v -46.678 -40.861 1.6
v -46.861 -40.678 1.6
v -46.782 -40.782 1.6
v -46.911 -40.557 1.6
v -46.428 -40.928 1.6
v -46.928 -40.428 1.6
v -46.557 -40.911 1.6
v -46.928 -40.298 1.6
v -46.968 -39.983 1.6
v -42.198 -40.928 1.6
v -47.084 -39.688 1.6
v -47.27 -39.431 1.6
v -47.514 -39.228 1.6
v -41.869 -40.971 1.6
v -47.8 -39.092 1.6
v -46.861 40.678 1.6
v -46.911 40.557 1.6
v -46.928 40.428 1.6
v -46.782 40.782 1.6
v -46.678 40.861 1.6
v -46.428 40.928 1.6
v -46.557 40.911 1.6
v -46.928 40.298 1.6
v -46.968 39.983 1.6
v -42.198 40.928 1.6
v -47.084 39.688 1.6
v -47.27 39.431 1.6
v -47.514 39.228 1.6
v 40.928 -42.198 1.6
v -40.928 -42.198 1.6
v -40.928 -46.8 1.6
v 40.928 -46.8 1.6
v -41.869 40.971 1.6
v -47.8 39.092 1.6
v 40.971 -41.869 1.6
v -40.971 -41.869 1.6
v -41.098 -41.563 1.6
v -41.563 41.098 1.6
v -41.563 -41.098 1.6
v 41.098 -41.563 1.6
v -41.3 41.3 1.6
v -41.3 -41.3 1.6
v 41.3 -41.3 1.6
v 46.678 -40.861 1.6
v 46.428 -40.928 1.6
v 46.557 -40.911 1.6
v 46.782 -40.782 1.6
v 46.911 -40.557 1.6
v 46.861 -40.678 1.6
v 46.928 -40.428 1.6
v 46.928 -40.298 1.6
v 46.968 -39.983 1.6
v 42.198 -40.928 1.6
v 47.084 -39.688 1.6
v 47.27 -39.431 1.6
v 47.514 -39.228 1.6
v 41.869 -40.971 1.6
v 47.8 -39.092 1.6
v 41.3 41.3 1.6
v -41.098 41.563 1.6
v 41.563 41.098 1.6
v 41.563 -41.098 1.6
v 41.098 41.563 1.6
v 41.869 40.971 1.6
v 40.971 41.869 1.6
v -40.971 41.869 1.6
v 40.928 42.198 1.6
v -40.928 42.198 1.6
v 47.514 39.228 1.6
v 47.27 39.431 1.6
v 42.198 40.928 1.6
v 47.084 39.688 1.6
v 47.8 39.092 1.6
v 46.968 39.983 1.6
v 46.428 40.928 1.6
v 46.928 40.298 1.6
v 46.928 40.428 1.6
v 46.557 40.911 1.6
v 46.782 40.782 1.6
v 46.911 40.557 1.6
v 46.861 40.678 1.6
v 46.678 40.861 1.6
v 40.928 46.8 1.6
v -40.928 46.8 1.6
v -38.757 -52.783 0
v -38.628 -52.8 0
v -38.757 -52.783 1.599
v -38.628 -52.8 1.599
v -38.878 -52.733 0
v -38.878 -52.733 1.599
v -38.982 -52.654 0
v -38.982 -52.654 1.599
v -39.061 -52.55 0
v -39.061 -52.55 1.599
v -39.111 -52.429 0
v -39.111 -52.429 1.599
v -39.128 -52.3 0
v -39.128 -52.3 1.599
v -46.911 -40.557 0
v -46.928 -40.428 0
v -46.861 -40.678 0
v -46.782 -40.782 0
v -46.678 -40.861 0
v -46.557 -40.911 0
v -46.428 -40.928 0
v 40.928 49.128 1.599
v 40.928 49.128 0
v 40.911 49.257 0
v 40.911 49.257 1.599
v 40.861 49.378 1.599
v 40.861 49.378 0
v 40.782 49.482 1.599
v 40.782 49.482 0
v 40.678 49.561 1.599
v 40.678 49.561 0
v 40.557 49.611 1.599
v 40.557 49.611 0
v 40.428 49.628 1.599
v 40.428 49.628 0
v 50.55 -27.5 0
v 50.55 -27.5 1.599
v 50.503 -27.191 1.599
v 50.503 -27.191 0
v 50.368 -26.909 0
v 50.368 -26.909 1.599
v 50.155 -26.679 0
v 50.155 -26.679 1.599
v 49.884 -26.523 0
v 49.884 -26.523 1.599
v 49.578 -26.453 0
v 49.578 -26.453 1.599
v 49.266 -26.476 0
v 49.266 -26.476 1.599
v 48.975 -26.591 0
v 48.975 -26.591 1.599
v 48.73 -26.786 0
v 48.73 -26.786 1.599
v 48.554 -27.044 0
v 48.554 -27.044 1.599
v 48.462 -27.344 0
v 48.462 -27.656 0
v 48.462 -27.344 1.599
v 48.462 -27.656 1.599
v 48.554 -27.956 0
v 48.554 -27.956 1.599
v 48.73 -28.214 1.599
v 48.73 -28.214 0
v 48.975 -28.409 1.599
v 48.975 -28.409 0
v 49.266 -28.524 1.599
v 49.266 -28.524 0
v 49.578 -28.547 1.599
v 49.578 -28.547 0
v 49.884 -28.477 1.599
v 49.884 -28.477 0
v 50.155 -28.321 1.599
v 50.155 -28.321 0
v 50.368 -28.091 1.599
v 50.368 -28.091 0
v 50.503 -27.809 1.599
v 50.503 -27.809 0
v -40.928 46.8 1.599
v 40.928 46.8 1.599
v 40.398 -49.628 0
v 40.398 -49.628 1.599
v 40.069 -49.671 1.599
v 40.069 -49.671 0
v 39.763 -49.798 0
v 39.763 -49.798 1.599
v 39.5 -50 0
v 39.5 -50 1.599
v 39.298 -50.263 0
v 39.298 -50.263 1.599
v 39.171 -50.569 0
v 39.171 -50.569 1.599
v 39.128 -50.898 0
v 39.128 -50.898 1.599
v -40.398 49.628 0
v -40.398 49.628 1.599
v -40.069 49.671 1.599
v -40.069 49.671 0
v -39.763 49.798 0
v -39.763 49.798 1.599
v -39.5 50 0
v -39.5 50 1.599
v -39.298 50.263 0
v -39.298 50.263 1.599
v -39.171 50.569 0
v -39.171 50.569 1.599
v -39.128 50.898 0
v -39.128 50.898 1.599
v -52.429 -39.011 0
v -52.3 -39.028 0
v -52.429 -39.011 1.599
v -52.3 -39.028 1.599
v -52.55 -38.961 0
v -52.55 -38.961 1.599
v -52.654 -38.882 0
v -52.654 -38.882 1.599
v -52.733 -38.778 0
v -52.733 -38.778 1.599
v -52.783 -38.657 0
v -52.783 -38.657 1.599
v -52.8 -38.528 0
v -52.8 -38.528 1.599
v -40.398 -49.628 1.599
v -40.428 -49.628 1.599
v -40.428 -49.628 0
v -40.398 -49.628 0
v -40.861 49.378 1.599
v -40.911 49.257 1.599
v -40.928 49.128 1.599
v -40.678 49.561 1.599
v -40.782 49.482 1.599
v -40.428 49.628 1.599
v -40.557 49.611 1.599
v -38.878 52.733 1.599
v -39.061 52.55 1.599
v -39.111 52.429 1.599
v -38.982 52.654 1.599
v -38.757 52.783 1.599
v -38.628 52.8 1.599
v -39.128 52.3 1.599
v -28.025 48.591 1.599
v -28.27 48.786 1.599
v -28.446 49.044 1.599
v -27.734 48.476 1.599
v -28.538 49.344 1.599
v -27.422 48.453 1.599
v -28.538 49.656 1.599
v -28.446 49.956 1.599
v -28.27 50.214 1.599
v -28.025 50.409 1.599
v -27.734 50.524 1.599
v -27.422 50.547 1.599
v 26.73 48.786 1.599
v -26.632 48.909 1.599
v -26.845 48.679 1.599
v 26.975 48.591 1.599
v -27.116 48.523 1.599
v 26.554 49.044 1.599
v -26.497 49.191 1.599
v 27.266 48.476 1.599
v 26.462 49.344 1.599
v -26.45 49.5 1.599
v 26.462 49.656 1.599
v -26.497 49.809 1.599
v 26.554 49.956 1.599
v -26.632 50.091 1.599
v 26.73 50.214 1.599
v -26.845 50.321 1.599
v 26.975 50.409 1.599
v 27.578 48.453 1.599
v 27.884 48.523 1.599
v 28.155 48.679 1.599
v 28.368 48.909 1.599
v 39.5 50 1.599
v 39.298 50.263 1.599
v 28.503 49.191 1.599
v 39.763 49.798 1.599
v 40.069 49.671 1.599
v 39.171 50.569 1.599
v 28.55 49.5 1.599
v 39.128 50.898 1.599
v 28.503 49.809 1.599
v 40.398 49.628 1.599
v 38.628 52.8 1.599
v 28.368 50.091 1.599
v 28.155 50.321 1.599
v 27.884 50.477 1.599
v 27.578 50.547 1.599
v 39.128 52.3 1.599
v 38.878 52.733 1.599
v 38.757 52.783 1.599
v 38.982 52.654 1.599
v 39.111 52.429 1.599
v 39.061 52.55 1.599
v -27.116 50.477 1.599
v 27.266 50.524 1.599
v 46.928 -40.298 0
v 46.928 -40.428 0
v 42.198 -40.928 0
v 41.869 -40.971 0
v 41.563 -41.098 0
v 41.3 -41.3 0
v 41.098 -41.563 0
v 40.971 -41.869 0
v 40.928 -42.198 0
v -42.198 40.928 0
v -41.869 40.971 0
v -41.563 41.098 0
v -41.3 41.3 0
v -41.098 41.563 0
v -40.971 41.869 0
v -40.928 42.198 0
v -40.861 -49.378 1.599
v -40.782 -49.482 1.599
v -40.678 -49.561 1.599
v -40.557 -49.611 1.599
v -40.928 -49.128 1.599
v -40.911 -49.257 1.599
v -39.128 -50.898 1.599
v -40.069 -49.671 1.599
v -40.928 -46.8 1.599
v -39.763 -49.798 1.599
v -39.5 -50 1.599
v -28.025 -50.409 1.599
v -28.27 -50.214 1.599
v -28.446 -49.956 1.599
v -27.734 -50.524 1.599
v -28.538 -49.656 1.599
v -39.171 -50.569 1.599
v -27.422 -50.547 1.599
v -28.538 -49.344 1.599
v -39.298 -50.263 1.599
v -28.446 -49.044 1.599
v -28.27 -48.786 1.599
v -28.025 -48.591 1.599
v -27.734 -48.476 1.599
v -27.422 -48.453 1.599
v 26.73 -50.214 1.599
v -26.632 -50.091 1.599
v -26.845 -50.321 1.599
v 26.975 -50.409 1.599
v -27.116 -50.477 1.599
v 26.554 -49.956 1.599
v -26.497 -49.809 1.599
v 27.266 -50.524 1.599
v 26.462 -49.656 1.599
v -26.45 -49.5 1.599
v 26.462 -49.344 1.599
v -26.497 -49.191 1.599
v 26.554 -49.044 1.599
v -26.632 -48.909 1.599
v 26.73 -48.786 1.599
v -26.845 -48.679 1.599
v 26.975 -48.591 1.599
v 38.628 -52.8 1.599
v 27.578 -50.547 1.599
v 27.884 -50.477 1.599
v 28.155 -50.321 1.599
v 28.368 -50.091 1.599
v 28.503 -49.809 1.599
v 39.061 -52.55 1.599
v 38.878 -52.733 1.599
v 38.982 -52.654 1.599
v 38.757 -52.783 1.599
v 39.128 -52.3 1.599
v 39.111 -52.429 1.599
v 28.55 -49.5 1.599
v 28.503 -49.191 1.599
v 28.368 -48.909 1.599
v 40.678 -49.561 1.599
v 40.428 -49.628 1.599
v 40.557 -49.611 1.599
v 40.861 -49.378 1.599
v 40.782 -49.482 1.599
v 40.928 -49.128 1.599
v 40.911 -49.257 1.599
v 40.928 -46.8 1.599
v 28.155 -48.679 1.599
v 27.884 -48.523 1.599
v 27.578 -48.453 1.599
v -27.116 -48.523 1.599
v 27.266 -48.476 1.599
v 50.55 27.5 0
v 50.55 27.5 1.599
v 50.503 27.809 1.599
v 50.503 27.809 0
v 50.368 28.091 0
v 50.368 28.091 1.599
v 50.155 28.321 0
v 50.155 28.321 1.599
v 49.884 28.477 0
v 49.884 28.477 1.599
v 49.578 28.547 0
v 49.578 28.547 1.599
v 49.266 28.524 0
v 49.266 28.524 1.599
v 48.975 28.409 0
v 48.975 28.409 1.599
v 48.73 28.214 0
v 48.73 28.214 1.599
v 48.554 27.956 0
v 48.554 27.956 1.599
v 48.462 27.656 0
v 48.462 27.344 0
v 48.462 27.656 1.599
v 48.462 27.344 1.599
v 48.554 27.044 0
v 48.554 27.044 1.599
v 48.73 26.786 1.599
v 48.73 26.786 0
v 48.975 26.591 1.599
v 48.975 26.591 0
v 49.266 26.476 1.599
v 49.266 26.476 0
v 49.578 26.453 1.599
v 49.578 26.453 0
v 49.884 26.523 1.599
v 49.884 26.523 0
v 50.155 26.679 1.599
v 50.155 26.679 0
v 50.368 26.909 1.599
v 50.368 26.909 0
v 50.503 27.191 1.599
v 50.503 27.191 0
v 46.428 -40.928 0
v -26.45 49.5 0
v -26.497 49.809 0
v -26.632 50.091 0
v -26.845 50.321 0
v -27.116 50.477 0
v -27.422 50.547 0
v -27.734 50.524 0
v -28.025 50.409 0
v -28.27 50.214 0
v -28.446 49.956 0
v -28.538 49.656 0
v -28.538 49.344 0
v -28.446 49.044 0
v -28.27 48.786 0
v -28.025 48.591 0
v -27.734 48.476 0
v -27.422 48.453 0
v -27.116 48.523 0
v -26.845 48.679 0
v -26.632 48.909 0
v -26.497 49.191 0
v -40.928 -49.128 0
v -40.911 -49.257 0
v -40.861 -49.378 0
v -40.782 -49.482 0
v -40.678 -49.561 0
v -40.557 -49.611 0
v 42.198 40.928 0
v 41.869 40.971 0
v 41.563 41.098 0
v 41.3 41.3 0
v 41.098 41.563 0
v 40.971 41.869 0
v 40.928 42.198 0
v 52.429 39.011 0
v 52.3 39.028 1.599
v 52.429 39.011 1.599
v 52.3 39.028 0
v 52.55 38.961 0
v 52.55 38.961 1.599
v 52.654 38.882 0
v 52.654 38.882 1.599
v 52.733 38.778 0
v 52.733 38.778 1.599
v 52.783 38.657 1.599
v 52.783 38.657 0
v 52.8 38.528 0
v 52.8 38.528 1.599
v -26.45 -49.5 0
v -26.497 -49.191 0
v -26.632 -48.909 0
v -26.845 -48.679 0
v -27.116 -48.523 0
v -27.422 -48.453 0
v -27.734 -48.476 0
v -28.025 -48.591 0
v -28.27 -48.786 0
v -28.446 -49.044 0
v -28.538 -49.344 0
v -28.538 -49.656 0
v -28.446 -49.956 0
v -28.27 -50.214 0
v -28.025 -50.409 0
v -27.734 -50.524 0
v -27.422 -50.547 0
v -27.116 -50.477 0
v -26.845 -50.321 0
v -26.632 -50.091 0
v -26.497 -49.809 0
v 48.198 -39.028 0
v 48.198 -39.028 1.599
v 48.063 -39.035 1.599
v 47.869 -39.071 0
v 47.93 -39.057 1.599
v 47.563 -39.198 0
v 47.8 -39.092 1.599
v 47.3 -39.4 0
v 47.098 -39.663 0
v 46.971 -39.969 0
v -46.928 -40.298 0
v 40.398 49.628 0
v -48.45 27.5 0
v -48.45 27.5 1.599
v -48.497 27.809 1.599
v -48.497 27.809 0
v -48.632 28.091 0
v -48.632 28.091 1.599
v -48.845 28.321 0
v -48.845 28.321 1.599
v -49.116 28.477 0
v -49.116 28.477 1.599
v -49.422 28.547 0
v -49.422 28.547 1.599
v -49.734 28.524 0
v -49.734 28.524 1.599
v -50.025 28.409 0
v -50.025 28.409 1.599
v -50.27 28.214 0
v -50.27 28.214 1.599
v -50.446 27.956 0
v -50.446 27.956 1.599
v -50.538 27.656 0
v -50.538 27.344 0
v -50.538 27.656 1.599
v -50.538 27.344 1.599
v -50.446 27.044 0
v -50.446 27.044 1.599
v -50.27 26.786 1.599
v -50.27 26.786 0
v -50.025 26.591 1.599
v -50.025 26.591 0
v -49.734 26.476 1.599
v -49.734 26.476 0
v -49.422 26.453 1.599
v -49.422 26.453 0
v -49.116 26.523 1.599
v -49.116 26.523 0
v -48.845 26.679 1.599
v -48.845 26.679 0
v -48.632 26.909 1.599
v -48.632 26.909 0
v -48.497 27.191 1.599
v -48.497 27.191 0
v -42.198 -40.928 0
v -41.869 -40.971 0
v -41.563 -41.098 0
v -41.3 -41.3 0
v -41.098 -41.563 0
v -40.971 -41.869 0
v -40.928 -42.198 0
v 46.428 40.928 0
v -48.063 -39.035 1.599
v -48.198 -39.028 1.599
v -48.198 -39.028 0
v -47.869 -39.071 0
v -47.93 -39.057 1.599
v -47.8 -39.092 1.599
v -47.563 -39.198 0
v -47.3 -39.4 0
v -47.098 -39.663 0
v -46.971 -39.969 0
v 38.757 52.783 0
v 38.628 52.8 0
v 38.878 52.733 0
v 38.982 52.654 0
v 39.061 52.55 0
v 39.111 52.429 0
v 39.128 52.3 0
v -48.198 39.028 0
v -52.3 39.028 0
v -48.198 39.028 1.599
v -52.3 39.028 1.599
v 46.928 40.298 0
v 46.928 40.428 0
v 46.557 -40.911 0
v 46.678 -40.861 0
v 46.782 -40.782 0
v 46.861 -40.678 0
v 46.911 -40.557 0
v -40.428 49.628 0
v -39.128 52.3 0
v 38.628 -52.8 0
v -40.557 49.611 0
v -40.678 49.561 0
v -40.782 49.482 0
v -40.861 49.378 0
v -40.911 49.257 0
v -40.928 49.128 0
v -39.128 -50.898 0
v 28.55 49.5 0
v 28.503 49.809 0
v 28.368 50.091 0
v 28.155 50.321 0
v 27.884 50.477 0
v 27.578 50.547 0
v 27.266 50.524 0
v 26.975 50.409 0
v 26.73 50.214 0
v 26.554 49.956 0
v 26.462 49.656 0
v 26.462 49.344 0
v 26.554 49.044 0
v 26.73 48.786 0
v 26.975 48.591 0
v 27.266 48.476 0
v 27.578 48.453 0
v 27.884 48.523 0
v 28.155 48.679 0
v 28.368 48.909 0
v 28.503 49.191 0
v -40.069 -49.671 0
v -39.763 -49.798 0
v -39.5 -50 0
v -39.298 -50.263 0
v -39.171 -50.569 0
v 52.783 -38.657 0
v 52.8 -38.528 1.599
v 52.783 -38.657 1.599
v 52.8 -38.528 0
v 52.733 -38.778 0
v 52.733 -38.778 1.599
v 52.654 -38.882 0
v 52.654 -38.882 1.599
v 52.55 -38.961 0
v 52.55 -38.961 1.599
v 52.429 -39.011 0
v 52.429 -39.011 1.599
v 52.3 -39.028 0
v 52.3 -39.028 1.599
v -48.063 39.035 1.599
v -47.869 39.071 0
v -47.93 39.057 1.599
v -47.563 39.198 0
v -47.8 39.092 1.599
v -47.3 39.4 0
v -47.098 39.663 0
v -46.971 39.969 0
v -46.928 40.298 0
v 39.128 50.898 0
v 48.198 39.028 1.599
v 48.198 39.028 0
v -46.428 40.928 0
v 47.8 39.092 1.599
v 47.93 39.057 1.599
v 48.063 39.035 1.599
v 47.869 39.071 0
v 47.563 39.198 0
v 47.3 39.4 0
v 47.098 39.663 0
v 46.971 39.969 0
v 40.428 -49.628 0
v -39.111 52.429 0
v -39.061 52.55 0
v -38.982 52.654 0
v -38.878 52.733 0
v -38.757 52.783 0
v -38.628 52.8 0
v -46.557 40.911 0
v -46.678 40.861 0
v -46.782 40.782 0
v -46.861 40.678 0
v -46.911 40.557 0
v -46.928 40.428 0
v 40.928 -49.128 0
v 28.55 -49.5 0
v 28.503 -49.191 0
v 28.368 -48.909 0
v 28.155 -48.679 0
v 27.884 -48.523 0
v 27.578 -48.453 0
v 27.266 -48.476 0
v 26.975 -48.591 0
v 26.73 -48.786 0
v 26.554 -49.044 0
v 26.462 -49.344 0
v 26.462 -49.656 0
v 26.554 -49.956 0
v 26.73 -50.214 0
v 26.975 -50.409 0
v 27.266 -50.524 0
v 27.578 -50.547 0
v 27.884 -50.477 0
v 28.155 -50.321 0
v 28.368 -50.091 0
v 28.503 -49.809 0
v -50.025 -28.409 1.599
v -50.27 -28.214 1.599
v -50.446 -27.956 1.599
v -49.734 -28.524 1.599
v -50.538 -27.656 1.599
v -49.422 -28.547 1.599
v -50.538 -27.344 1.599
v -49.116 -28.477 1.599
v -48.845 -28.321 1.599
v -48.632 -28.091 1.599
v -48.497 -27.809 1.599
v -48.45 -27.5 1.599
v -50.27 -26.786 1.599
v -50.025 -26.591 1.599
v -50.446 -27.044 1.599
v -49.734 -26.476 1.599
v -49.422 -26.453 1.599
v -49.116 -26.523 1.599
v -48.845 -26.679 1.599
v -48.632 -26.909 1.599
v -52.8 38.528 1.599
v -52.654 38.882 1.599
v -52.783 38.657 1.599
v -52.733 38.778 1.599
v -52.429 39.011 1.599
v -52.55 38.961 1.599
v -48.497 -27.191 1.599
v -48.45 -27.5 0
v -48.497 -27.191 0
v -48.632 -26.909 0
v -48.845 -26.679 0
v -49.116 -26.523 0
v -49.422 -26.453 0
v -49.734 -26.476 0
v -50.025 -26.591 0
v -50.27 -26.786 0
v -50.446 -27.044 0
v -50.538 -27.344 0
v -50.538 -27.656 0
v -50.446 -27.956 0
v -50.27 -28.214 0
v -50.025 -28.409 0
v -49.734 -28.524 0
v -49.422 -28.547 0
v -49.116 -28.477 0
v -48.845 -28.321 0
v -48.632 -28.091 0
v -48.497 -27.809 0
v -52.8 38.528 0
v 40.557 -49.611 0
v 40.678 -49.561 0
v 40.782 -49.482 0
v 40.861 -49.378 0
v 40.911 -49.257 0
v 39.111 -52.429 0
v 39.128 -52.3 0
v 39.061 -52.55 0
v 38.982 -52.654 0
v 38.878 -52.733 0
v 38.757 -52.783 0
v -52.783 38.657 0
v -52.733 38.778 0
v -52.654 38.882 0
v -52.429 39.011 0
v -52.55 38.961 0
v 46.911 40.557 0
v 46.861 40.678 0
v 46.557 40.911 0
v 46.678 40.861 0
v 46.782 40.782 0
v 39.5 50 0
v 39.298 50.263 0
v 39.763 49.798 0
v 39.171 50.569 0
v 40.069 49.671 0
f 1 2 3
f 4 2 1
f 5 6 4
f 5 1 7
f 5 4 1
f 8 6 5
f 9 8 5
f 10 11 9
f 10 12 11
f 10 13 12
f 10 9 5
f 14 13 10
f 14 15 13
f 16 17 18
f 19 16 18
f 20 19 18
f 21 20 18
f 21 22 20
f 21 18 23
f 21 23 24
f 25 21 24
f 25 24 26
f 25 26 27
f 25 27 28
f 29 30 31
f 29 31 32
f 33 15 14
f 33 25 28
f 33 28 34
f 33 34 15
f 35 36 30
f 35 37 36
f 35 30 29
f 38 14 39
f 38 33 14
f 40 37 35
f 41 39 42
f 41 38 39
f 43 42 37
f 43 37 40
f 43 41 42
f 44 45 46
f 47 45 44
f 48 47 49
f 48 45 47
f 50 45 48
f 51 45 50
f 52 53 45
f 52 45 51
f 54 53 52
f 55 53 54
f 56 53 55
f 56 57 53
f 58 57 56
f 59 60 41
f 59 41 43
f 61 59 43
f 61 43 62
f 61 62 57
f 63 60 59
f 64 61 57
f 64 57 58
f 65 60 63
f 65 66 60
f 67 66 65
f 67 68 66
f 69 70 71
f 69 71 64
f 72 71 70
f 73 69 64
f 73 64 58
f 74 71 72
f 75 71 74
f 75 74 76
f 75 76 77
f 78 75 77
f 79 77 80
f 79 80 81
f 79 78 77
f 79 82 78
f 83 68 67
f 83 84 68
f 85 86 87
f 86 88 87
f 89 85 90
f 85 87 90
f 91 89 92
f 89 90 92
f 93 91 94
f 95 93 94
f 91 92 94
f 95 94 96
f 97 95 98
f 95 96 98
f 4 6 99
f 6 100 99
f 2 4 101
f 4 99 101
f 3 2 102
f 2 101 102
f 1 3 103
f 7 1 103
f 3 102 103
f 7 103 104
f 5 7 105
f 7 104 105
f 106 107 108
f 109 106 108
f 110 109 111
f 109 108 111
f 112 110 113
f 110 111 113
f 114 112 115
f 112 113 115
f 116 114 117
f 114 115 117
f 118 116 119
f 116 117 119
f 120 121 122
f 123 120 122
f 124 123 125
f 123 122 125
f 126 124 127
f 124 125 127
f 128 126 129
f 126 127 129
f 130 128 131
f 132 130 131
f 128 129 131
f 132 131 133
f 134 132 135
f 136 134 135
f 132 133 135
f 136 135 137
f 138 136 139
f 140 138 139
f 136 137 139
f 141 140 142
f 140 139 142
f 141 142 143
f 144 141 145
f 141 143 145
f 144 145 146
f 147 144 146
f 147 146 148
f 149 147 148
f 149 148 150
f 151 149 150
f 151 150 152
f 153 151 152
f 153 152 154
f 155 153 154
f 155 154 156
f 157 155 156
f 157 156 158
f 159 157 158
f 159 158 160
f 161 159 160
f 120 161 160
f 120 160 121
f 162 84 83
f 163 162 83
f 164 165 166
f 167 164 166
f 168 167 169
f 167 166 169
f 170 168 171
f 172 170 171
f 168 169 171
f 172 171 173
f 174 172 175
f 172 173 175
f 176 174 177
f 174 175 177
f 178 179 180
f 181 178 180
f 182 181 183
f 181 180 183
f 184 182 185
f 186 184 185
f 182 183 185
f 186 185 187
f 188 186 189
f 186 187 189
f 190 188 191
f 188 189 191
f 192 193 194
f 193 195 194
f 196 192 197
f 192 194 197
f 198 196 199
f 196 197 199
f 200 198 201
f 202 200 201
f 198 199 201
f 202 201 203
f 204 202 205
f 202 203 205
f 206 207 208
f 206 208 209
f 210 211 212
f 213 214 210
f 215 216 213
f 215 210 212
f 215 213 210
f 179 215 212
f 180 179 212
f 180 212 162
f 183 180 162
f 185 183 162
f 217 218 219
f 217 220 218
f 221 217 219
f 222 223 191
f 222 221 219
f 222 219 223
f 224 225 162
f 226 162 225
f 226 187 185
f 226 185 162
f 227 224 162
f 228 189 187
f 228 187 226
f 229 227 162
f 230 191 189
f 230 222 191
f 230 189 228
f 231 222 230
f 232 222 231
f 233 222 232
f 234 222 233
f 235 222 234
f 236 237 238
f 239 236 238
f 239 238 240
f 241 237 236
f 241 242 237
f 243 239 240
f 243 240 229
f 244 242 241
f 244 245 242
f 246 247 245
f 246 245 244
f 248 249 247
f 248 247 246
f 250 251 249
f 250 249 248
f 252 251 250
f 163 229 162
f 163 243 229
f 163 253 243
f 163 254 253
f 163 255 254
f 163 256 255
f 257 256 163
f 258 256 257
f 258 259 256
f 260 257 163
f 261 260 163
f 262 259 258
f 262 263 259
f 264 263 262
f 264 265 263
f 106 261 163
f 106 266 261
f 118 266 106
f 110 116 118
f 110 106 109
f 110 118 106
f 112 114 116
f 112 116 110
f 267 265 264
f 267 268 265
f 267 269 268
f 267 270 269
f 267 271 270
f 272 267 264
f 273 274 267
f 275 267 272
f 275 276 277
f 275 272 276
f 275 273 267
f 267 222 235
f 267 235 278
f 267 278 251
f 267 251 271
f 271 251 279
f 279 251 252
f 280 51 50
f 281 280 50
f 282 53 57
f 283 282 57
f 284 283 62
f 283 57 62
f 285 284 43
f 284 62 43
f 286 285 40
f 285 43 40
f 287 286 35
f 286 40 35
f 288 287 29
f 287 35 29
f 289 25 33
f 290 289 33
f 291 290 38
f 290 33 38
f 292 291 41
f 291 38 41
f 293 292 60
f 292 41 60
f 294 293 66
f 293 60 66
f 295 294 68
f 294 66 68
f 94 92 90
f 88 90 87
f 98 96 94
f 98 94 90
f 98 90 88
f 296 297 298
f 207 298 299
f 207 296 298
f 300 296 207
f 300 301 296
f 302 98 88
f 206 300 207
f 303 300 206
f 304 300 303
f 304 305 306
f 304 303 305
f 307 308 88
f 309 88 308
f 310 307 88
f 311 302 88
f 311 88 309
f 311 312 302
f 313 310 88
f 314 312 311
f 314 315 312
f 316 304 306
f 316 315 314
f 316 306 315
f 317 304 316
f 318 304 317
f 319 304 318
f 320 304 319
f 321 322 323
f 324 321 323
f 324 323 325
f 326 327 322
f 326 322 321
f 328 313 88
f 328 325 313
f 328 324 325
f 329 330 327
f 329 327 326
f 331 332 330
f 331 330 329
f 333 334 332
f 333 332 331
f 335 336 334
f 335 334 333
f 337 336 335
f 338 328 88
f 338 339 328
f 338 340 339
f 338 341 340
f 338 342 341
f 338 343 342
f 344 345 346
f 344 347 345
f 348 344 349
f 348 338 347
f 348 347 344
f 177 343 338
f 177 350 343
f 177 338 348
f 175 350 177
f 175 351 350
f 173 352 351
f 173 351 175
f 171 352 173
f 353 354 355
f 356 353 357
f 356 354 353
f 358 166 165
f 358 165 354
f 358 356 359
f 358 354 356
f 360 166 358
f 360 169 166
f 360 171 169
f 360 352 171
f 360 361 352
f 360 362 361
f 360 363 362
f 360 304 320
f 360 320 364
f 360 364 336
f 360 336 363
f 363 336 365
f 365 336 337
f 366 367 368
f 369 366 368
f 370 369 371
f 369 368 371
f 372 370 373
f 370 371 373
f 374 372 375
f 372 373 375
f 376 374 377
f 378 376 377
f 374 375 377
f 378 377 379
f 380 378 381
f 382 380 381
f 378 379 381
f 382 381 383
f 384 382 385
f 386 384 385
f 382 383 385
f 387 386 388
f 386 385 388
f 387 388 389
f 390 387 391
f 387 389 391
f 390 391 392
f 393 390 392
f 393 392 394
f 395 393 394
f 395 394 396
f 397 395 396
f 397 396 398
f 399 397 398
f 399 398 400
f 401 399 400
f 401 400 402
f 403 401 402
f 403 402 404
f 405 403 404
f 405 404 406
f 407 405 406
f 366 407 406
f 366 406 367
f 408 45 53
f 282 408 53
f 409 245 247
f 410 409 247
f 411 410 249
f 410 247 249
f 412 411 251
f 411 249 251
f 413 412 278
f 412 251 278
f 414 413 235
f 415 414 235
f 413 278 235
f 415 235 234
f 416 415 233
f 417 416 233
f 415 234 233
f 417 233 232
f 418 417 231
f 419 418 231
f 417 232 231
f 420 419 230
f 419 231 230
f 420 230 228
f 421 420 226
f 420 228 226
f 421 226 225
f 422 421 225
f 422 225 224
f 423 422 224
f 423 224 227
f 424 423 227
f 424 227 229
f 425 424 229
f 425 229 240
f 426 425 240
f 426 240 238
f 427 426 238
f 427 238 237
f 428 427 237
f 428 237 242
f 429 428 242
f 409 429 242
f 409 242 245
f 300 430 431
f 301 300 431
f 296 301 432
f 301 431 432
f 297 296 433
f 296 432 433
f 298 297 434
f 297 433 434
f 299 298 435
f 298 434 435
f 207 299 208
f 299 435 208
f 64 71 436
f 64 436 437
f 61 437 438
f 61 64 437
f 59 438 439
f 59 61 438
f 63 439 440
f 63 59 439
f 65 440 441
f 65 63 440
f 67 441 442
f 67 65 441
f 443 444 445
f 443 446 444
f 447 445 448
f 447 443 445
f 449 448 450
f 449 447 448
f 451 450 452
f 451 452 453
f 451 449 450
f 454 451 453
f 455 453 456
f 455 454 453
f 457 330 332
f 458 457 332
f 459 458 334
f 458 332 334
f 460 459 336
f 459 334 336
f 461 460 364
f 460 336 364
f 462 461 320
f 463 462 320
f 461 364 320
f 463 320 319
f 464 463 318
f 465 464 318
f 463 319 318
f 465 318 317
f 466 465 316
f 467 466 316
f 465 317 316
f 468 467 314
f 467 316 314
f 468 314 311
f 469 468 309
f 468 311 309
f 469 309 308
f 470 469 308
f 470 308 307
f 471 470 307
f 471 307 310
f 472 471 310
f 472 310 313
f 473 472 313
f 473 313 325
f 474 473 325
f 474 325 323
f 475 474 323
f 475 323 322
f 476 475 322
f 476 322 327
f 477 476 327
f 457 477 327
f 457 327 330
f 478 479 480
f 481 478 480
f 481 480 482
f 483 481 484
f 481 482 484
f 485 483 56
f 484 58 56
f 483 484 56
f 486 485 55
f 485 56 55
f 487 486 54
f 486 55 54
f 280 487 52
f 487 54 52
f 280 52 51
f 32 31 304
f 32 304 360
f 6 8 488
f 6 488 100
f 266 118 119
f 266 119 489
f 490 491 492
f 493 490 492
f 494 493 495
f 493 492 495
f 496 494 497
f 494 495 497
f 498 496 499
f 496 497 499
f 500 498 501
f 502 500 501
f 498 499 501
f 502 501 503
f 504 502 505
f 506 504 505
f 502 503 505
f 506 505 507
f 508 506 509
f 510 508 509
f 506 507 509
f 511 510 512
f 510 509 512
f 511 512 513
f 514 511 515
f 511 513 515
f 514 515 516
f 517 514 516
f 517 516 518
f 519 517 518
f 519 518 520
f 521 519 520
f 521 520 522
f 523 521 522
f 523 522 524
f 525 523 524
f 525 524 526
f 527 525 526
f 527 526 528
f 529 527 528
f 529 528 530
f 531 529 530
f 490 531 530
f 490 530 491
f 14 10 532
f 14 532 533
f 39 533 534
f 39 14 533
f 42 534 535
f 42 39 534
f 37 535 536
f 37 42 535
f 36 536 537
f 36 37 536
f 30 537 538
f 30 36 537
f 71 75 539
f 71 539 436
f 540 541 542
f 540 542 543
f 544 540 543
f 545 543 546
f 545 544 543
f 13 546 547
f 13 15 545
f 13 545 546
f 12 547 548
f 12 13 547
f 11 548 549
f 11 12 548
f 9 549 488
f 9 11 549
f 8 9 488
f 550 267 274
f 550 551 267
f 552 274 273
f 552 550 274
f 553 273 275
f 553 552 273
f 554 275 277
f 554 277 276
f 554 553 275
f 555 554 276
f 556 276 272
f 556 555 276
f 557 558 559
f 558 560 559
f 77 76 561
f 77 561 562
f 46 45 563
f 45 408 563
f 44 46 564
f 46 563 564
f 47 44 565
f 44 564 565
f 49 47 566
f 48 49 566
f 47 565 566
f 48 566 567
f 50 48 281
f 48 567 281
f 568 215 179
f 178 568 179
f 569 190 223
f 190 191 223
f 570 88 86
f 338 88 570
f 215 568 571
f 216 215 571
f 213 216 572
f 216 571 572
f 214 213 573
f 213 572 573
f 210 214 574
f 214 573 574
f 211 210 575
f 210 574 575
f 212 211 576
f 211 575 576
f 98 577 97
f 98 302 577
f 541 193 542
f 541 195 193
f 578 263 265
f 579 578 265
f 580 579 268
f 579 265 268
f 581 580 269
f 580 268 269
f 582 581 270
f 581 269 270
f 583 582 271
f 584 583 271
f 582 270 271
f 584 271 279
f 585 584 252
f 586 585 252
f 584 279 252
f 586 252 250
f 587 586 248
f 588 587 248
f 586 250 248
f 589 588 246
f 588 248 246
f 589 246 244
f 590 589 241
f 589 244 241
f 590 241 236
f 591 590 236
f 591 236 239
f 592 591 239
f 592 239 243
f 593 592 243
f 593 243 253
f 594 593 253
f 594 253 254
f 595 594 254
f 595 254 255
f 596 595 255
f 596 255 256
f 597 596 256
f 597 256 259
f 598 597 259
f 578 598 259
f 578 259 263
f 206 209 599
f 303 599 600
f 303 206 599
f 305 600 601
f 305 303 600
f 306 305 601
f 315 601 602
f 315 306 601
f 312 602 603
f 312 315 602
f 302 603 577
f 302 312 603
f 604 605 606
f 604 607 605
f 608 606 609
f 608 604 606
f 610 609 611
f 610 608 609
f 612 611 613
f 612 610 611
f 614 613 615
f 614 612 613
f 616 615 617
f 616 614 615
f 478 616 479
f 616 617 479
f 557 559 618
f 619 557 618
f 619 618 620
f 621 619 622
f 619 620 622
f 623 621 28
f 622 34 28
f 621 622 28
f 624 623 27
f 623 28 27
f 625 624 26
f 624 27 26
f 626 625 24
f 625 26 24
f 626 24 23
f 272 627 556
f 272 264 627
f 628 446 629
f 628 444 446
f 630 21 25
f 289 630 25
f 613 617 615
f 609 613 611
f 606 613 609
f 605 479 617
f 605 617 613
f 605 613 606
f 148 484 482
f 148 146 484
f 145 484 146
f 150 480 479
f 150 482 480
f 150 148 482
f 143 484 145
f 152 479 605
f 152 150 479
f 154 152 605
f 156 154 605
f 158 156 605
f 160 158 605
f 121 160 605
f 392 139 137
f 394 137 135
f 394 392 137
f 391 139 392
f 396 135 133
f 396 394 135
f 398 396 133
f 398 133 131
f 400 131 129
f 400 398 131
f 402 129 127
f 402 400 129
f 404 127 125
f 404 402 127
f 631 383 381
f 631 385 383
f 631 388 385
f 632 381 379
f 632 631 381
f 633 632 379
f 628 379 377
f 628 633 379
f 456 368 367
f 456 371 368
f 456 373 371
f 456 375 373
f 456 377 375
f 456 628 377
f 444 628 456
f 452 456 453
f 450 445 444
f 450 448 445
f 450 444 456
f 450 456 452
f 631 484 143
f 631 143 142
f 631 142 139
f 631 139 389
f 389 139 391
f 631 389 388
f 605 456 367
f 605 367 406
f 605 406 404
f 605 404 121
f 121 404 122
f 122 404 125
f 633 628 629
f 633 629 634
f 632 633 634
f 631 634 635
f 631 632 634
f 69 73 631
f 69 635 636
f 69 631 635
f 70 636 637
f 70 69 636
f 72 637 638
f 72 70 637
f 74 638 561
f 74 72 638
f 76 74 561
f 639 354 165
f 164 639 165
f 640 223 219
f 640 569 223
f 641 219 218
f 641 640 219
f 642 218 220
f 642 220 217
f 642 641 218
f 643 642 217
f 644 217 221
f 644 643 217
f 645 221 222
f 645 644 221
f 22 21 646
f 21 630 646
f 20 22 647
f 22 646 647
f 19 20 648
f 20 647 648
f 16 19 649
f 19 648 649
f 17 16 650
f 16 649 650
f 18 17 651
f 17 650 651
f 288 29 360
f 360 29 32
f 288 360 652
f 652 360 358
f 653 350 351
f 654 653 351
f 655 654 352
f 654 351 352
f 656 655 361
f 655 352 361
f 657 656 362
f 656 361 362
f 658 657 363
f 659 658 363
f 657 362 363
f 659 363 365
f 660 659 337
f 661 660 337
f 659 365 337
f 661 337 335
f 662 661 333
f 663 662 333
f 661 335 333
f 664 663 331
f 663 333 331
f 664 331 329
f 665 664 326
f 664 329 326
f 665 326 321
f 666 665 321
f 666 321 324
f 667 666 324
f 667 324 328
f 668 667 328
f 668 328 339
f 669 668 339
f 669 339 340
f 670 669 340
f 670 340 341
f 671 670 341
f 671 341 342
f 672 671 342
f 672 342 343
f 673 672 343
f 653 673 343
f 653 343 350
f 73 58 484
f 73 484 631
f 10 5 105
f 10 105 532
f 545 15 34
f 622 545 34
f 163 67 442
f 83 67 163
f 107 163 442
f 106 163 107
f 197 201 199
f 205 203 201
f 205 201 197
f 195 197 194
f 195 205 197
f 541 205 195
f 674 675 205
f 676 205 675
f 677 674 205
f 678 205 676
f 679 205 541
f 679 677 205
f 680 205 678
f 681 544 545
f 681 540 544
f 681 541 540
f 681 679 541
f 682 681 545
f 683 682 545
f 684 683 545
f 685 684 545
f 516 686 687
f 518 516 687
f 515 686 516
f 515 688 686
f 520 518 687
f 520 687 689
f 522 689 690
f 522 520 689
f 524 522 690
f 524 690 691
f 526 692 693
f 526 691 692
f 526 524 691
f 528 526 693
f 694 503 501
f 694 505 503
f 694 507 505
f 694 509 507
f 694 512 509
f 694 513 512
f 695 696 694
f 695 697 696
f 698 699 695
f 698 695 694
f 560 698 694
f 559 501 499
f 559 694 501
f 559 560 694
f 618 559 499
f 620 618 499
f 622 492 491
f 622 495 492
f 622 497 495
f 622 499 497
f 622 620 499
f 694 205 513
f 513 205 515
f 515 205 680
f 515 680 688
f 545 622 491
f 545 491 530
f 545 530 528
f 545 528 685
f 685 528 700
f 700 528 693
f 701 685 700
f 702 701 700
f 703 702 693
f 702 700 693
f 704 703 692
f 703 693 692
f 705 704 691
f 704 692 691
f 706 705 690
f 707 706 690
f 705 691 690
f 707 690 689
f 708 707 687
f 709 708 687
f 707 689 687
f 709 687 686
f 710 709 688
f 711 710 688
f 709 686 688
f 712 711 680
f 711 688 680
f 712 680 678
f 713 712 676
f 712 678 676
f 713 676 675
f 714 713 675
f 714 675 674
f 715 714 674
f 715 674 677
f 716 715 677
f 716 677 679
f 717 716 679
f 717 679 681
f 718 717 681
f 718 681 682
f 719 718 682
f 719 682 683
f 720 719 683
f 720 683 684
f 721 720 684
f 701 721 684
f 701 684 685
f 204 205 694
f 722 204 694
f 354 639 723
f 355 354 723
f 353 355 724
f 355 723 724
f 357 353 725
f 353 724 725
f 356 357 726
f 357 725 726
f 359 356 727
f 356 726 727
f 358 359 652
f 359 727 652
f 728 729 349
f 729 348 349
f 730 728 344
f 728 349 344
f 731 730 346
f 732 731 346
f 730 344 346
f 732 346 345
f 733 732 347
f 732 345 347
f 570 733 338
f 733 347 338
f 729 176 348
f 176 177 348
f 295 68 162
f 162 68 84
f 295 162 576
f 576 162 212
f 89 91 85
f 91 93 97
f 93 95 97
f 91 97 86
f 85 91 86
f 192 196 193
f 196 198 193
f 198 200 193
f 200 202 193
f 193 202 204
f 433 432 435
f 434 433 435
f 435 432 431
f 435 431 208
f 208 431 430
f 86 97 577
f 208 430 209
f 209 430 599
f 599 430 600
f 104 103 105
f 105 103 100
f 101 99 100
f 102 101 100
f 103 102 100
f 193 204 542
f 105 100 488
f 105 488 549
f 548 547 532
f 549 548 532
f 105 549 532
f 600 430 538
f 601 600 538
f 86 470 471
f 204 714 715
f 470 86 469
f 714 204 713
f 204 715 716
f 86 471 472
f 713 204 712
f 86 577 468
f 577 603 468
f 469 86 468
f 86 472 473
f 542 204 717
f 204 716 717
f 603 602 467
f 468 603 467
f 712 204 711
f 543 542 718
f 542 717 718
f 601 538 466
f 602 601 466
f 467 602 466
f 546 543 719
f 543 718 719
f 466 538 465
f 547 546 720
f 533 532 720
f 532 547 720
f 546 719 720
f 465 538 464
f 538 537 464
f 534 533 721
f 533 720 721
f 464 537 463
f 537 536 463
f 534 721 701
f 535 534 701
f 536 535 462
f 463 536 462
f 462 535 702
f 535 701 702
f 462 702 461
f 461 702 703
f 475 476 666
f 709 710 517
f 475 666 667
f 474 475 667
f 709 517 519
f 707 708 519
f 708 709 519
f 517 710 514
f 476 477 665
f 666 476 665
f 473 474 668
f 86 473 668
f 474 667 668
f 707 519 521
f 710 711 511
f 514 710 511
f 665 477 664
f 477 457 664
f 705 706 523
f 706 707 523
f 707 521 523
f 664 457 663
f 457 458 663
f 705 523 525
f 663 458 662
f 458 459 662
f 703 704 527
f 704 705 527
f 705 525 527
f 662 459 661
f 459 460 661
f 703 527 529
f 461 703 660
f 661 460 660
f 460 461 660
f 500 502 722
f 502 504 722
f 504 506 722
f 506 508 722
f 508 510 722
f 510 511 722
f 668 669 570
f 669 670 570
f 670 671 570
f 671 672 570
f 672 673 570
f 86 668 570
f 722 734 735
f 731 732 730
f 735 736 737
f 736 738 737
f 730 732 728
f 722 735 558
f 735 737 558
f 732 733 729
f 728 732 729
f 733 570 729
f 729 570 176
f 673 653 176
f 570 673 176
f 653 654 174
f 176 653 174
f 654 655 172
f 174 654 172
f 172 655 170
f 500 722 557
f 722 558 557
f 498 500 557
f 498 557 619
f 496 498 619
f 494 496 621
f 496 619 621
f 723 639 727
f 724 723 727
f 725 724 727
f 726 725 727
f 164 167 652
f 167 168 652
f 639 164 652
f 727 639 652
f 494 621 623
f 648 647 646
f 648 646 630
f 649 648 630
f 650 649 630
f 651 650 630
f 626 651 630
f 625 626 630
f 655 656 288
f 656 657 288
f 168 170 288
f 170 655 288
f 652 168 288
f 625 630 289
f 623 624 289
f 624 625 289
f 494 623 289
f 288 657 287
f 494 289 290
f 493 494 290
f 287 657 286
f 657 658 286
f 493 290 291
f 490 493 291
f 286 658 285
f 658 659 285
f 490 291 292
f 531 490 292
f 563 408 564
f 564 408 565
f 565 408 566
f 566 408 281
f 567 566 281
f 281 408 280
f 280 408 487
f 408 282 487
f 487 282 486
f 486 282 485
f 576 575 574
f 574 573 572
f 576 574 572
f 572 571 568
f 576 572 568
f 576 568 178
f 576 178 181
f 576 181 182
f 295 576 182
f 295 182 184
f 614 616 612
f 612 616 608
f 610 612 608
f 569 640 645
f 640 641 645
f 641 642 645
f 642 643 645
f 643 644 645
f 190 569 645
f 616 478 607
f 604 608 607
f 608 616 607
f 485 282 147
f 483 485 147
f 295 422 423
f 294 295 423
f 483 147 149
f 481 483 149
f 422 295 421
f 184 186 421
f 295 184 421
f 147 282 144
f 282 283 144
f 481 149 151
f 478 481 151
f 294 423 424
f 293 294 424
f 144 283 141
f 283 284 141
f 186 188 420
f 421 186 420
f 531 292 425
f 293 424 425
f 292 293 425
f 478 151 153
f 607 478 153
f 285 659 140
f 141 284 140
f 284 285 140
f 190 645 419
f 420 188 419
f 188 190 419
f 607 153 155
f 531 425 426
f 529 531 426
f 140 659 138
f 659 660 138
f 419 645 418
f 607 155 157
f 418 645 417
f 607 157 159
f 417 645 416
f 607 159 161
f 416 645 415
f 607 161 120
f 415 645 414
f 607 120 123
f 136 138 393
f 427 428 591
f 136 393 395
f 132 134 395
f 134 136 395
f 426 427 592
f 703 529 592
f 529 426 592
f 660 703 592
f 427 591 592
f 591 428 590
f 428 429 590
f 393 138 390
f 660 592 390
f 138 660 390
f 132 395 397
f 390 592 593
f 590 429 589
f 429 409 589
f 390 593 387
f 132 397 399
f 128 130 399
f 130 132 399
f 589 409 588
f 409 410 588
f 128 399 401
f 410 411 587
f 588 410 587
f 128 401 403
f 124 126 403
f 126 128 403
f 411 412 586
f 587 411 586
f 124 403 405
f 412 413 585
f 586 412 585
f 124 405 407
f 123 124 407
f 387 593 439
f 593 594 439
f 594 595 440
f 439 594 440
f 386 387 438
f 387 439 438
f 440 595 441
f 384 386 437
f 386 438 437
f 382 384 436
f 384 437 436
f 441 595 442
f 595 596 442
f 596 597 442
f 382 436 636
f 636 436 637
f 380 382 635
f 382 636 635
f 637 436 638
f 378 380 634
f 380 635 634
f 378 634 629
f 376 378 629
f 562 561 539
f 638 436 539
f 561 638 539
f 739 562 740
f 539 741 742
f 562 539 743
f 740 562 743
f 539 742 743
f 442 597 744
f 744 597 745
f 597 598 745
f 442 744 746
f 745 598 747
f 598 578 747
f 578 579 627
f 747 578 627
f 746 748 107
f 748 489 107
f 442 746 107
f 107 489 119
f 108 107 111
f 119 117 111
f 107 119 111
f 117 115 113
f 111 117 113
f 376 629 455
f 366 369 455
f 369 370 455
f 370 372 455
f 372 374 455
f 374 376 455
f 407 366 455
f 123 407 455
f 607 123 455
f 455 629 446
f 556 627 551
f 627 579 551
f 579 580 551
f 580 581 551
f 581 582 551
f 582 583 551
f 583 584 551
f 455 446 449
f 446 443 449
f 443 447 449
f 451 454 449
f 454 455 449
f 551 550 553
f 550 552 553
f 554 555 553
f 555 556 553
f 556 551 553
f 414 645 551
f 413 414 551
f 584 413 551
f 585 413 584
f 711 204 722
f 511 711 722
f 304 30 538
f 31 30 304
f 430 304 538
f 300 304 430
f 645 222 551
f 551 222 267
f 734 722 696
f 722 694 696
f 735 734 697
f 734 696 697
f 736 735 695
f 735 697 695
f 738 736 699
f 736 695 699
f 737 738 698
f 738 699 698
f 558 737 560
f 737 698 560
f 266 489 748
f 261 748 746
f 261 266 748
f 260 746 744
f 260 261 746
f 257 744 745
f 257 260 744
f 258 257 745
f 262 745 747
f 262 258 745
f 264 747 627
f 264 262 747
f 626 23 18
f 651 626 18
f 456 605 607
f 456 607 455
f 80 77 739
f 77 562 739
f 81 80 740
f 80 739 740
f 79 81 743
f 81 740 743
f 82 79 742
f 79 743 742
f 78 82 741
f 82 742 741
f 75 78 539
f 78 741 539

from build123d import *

# Parameters (mm, degrees)
SKETCH1_W                 = 106
SKETCH1_H                 = 106
MAINOUTLINE_DEPTH         = 1.6
SKETCH4_W                 = 11.7
SKETCH4_H                 = 11.7
RAILCUTOUTS_DEPTH         = 2.6
FILLETCUTOUTS_START       = -2.6
SKETCH13_W                = 5.7
SKETCH13_H                = 1.9
SKETCH13_W_2              = 1.8
SKETCH13_H_2              = 3
FILLETCUTOUTS_DEPTH       = 3.6
SMOOTHCORNER_DEPTH        = 10
MIRROR2_COPY_1_SKETCH_W   = 11.7
MIRROR2_COPY_1_SKETCH_H   = 11.7
MIRROR2_COPY_1_DEPTH      = 2.6
MIRROR2_START             = -2.6
MIRROR2_COPY_2_SKETCH_W   = 5.7
MIRROR2_COPY_2_SKETCH_H   = 1.9
MIRROR2_COPY_2_SKETCH_W_2 = 1.8
MIRROR2_COPY_2_SKETCH_H_2 = 3
MIRROR2_COPY_2_DEPTH      = 3.6
MIRROR2_COPY_3_DEPTH      = 10
MIRROR2_COPY_4_SKETCH_W   = 11.7
MIRROR2_COPY_4_SKETCH_H   = 11.7
MIRROR2_COPY_4_DEPTH      = 2.6
MIRROR2_COPY_5_SKETCH_W   = 5.7
MIRROR2_COPY_5_SKETCH_H   = 1.9
MIRROR2_COPY_5_SKETCH_W_2 = 1.8
MIRROR2_COPY_5_SKETCH_H_2 = 3
MIRROR2_COPY_5_DEPTH      = 3.6
FILLET10_R                = 0.5
M2_CLEARANCE_HOLE1_D      = 2.1
SKETCH16_W                = 90
SKETCH16_H                = 6.2
SKETCH16_W_2              = 5.2
SKETCH16_H_2              = 90
CUT_EXTRUDE6_DEPTH        = 0.001
SKETCH24_OUTSIDE_W        = 137.984
SKETCH24_OUTSIDE_H        = 137.984
SKETCH24_OUTSIDE_W_2      = 105.6
SKETCH24_OUTSIDE_H_2      = 105.6
CUT_EXTRUDE19_DEPTH       = 2.6
FILLET7_R                 = 0.5


with BuildPart() as part:
    # Sketch1 → mainOutline (new body)
    with BuildSketch(Plane.XY):
        Rectangle(SKETCH1_W, SKETCH1_H)
    extrude(amount=MAINOUTLINE_DEPTH)

    # Sketch4 → railCutouts (cut, through all)
    with BuildSketch(Plane(origin=(0, 0, 0), x_dir=(-1, 0, 0), z_dir=(0, 0, -1))):
        with Locations((47.15, 47.15)):
            Rectangle(SKETCH4_W, SKETCH4_H)
    railcutouts = extrude(amount=-RAILCUTOUTS_DEPTH, mode=Mode.SUBTRACT)

    # Sketch13 → filletCutouts (cut)
    with BuildSketch(Plane(origin=(0, 0, 0), x_dir=(-1, 0, 0), z_dir=(0, 0, -1)).offset(FILLETCUTOUTS_START)):
        with Locations((50.15, 40.35)):
            Rectangle(SKETCH13_W, SKETCH13_H)
        with Locations((40.4, 51.5)):
            Rectangle(SKETCH13_W_2, SKETCH13_H_2)
    filletcutouts = extrude(amount=FILLETCUTOUTS_DEPTH, mode=Mode.SUBTRACT)

    # Sketch27 → smoothCorner (cut)
    with BuildSketch(Plane.XY.offset(1.6)):
        with BuildLine():
            Line((-40.928025612, 42.198025612), (-40.928025612, 49.628025612))
            Line((-40.928025612, 49.628025612), (-40.398025612, 49.628025612))
            ThreePointArc((-40.398025612, 49.628025612), (-39.5, 50), (-39.128025612, 50.898025612))
            Line((-39.128025612, 50.898025612), (-39.128025612, 53))
            Line((-39.128025612, 53), (-53, 53))
            Line((-53, 53), (-53, 39.028025612))
            Line((-53, 39.028025612), (-48.198025612, 39.028025612))
            ThreePointArc((-48.198025612, 39.028025612), (-47.3, 39.4), (-46.928025612, 40.298025612))
            Line((-46.928025612, 40.298025612), (-46.928025612, 40.928025612))
            Line((-46.928025612, 40.928025612), (-42.198025612, 40.928025612))
            ThreePointArc((-42.198025612, 40.928025612), (-41.3, 41.3), (-40.928025612, 42.198025612))
        make_face()
    smoothcorner = extrude(amount=-SMOOTHCORNER_DEPTH, mode=Mode.SUBTRACT)

    # Mirror1: railCutouts, filletCutouts, smoothCorner across plane
    add(railcutouts.mirror(Plane(origin=(0, 0, 0), x_dir=(0, 0, 1), z_dir=(1, 0, 0))), mode=Mode.SUBTRACT)
    add(filletcutouts.mirror(Plane(origin=(0, 0, 0), x_dir=(0, 0, 1), z_dir=(1, 0, 0))), mode=Mode.SUBTRACT)
    add(smoothcorner.mirror(Plane(origin=(0, 0, 0), x_dir=(0, 0, 1), z_dir=(1, 0, 0))), mode=Mode.SUBTRACT)

    # Mirror2: smoothCorner across plane
    add(smoothcorner.mirror(Plane.ZX), mode=Mode.SUBTRACT)

    # Mirror2 copy 1 sketch → Mirror2 copy 1 (cut, through all)
    with BuildSketch(Plane(origin=(0, 0, 0), x_dir=(1, 0, 0), z_dir=(0, 0, -1))):
        with Locations((47.15, 47.15)):
            Rectangle(MIRROR2_COPY_1_SKETCH_W, MIRROR2_COPY_1_SKETCH_H)
    extrude(amount=-MIRROR2_COPY_1_DEPTH, mode=Mode.SUBTRACT)

    # Mirror2 copy 2 sketch → Mirror2 copy 2 (cut)
    with BuildSketch(Plane(origin=(0, 0, 0), x_dir=(1, 0, 0), z_dir=(0, 0, -1)).offset(MIRROR2_START)):
        with Locations((50.15, 40.35)):
            Rectangle(MIRROR2_COPY_2_SKETCH_W, MIRROR2_COPY_2_SKETCH_H)
        with Locations((40.4, 51.5)):
            Rectangle(MIRROR2_COPY_2_SKETCH_W_2, MIRROR2_COPY_2_SKETCH_H_2)
    extrude(amount=MIRROR2_COPY_2_DEPTH, mode=Mode.SUBTRACT)

    # Mirror2 copy 3 sketch → Mirror2 copy 3 (cut)
    with BuildSketch(Plane(origin=(0, 0, 1.6), x_dir=(-1, 0, 0), z_dir=(0, 0, 1))):
        with BuildLine():
            Line((-40.928025612, 42.198025612), (-40.928025612, 49.628025612))
            Line((-40.928025612, 49.628025612), (-40.398025612, 49.628025612))
            ThreePointArc((-40.398025612, 49.628025612), (-39.5, 50), (-39.128025612, 50.898025612))
            Line((-39.128025612, 50.898025612), (-39.128025612, 53))
            Line((-39.128025612, 53), (-53, 53))
            Line((-53, 53), (-53, 39.028025612))
            Line((-53, 39.028025612), (-48.198025612, 39.028025612))
            ThreePointArc((-48.198025612, 39.028025612), (-47.3, 39.4), (-46.928025612, 40.298025612))
            Line((-46.928025612, 40.298025612), (-46.928025612, 40.928025612))
            Line((-46.928025612, 40.928025612), (-42.198025612, 40.928025612))
            ThreePointArc((-42.198025612, 40.928025612), (-41.3, 41.3), (-40.928025612, 42.198025612))
        make_face()
    extrude(amount=-MIRROR2_COPY_3_DEPTH, mode=Mode.SUBTRACT)

    # Mirror2 copy 4 sketch → Mirror2 copy 4 (cut, through all)
    with BuildSketch(Plane(origin=(0, 0, 0), x_dir=(-1, 0, 0), z_dir=(0, 0, -1))):
        with Locations((47.15, -47.15)):
            Rectangle(MIRROR2_COPY_4_SKETCH_W, MIRROR2_COPY_4_SKETCH_H)
    extrude(amount=-MIRROR2_COPY_4_DEPTH, mode=Mode.SUBTRACT)

    # Mirror2 copy 5 sketch → Mirror2 copy 5 (cut)
    with BuildSketch(Plane(origin=(0, 0, 0), x_dir=(-1, 0, 0), z_dir=(0, 0, -1)).offset(MIRROR2_START)):
        with Locations((50.15, -40.35)):
            Rectangle(MIRROR2_COPY_5_SKETCH_W, MIRROR2_COPY_5_SKETCH_H)
        with Locations((40.4, -51.5)):
            Rectangle(MIRROR2_COPY_5_SKETCH_W_2, MIRROR2_COPY_5_SKETCH_H_2)
    extrude(amount=MIRROR2_COPY_5_DEPTH, mode=Mode.SUBTRACT)

    # Fillet10
    fillet10_edges = [part.edges().sort_by_distance(p)[0] for p in [
        (40.928025612, 49.628025612, 0.8),
        (46.928025612, 40.928025612, 0.8),
        (46.928025612, -40.928025612, 0.8),
        (40.928025612, -49.628025612, 0.8),
        (-40.928025612, -49.628025612, 0.8),
        (-46.928025612, -40.928025612, 0.8),
        (-46.928025612, 40.928025612, 0.8),
        (-40.928025612, 49.628025612, 0.8),
    ]]
    fillet(fillet10_edges, radius=FILLET10_R)

    # M2 Clearance Hole1 (through all)
    with Locations(Plane(origin=(0, 0, 0), x_dir=(-1, 0, 0), z_dir=(0, 0, -1))):
        with Locations((49.5, -27.5), (27.5, -49.5), (-49.5, -27.5), (-27.5, -49.5), (-27.5, 49.5), (-49.5, 27.5), (27.5, 49.5), (49.5, 27.5)):
            Hole(M2_CLEARANCE_HOLE1_D / 2)

    # Sketch16 → Cut-Extrude6 (cut)
    with BuildSketch(Plane.XY.offset(1.6)):
        with Locations((0, -49.9)):
            Rectangle(SKETCH16_W, SKETCH16_H)
        with Locations((0, 49.9)):
            Rectangle(SKETCH16_W, SKETCH16_H)
        with Locations((-50.4, 0)):
            Rectangle(SKETCH16_W_2, SKETCH16_H_2)
        with Locations((50.4, 0)):
            Rectangle(SKETCH16_W_2, SKETCH16_H_2)
    extrude(amount=-CUT_EXTRUDE6_DEPTH, mode=Mode.SUBTRACT)

    # Sketch24 outside → Cut-Extrude19 (cut, through all)
    with BuildSketch(Plane.XY.offset(1.6)):
        Rectangle(SKETCH24_OUTSIDE_W, SKETCH24_OUTSIDE_H)
        Rectangle(SKETCH24_OUTSIDE_W_2, SKETCH24_OUTSIDE_H_2, mode=Mode.SUBTRACT)
    extrude(amount=-CUT_EXTRUDE19_DEPTH, mode=Mode.SUBTRACT)

    # Fillet7
    fillet7_edges = [part.edges().sort_by_distance(p)[0] for p in [
        (-52.8, -39.028025612, 0.7995),
        (-39.128025612, -52.8, 0.7995),
        (52.8, -39.028025612, 0.7995),
        (39.128025612, 52.8, 0.7995),
        (52.8, 39.028025612, 0.7995),
        (39.128025612, -52.8, 0.7995),
        (-52.8, 39.028025612, 0.7995),
        (-39.128025612, 52.8, 0.7995),
    ]]
    fillet(fillet7_edges, radius=FILLET7_R)


solid = part.part
